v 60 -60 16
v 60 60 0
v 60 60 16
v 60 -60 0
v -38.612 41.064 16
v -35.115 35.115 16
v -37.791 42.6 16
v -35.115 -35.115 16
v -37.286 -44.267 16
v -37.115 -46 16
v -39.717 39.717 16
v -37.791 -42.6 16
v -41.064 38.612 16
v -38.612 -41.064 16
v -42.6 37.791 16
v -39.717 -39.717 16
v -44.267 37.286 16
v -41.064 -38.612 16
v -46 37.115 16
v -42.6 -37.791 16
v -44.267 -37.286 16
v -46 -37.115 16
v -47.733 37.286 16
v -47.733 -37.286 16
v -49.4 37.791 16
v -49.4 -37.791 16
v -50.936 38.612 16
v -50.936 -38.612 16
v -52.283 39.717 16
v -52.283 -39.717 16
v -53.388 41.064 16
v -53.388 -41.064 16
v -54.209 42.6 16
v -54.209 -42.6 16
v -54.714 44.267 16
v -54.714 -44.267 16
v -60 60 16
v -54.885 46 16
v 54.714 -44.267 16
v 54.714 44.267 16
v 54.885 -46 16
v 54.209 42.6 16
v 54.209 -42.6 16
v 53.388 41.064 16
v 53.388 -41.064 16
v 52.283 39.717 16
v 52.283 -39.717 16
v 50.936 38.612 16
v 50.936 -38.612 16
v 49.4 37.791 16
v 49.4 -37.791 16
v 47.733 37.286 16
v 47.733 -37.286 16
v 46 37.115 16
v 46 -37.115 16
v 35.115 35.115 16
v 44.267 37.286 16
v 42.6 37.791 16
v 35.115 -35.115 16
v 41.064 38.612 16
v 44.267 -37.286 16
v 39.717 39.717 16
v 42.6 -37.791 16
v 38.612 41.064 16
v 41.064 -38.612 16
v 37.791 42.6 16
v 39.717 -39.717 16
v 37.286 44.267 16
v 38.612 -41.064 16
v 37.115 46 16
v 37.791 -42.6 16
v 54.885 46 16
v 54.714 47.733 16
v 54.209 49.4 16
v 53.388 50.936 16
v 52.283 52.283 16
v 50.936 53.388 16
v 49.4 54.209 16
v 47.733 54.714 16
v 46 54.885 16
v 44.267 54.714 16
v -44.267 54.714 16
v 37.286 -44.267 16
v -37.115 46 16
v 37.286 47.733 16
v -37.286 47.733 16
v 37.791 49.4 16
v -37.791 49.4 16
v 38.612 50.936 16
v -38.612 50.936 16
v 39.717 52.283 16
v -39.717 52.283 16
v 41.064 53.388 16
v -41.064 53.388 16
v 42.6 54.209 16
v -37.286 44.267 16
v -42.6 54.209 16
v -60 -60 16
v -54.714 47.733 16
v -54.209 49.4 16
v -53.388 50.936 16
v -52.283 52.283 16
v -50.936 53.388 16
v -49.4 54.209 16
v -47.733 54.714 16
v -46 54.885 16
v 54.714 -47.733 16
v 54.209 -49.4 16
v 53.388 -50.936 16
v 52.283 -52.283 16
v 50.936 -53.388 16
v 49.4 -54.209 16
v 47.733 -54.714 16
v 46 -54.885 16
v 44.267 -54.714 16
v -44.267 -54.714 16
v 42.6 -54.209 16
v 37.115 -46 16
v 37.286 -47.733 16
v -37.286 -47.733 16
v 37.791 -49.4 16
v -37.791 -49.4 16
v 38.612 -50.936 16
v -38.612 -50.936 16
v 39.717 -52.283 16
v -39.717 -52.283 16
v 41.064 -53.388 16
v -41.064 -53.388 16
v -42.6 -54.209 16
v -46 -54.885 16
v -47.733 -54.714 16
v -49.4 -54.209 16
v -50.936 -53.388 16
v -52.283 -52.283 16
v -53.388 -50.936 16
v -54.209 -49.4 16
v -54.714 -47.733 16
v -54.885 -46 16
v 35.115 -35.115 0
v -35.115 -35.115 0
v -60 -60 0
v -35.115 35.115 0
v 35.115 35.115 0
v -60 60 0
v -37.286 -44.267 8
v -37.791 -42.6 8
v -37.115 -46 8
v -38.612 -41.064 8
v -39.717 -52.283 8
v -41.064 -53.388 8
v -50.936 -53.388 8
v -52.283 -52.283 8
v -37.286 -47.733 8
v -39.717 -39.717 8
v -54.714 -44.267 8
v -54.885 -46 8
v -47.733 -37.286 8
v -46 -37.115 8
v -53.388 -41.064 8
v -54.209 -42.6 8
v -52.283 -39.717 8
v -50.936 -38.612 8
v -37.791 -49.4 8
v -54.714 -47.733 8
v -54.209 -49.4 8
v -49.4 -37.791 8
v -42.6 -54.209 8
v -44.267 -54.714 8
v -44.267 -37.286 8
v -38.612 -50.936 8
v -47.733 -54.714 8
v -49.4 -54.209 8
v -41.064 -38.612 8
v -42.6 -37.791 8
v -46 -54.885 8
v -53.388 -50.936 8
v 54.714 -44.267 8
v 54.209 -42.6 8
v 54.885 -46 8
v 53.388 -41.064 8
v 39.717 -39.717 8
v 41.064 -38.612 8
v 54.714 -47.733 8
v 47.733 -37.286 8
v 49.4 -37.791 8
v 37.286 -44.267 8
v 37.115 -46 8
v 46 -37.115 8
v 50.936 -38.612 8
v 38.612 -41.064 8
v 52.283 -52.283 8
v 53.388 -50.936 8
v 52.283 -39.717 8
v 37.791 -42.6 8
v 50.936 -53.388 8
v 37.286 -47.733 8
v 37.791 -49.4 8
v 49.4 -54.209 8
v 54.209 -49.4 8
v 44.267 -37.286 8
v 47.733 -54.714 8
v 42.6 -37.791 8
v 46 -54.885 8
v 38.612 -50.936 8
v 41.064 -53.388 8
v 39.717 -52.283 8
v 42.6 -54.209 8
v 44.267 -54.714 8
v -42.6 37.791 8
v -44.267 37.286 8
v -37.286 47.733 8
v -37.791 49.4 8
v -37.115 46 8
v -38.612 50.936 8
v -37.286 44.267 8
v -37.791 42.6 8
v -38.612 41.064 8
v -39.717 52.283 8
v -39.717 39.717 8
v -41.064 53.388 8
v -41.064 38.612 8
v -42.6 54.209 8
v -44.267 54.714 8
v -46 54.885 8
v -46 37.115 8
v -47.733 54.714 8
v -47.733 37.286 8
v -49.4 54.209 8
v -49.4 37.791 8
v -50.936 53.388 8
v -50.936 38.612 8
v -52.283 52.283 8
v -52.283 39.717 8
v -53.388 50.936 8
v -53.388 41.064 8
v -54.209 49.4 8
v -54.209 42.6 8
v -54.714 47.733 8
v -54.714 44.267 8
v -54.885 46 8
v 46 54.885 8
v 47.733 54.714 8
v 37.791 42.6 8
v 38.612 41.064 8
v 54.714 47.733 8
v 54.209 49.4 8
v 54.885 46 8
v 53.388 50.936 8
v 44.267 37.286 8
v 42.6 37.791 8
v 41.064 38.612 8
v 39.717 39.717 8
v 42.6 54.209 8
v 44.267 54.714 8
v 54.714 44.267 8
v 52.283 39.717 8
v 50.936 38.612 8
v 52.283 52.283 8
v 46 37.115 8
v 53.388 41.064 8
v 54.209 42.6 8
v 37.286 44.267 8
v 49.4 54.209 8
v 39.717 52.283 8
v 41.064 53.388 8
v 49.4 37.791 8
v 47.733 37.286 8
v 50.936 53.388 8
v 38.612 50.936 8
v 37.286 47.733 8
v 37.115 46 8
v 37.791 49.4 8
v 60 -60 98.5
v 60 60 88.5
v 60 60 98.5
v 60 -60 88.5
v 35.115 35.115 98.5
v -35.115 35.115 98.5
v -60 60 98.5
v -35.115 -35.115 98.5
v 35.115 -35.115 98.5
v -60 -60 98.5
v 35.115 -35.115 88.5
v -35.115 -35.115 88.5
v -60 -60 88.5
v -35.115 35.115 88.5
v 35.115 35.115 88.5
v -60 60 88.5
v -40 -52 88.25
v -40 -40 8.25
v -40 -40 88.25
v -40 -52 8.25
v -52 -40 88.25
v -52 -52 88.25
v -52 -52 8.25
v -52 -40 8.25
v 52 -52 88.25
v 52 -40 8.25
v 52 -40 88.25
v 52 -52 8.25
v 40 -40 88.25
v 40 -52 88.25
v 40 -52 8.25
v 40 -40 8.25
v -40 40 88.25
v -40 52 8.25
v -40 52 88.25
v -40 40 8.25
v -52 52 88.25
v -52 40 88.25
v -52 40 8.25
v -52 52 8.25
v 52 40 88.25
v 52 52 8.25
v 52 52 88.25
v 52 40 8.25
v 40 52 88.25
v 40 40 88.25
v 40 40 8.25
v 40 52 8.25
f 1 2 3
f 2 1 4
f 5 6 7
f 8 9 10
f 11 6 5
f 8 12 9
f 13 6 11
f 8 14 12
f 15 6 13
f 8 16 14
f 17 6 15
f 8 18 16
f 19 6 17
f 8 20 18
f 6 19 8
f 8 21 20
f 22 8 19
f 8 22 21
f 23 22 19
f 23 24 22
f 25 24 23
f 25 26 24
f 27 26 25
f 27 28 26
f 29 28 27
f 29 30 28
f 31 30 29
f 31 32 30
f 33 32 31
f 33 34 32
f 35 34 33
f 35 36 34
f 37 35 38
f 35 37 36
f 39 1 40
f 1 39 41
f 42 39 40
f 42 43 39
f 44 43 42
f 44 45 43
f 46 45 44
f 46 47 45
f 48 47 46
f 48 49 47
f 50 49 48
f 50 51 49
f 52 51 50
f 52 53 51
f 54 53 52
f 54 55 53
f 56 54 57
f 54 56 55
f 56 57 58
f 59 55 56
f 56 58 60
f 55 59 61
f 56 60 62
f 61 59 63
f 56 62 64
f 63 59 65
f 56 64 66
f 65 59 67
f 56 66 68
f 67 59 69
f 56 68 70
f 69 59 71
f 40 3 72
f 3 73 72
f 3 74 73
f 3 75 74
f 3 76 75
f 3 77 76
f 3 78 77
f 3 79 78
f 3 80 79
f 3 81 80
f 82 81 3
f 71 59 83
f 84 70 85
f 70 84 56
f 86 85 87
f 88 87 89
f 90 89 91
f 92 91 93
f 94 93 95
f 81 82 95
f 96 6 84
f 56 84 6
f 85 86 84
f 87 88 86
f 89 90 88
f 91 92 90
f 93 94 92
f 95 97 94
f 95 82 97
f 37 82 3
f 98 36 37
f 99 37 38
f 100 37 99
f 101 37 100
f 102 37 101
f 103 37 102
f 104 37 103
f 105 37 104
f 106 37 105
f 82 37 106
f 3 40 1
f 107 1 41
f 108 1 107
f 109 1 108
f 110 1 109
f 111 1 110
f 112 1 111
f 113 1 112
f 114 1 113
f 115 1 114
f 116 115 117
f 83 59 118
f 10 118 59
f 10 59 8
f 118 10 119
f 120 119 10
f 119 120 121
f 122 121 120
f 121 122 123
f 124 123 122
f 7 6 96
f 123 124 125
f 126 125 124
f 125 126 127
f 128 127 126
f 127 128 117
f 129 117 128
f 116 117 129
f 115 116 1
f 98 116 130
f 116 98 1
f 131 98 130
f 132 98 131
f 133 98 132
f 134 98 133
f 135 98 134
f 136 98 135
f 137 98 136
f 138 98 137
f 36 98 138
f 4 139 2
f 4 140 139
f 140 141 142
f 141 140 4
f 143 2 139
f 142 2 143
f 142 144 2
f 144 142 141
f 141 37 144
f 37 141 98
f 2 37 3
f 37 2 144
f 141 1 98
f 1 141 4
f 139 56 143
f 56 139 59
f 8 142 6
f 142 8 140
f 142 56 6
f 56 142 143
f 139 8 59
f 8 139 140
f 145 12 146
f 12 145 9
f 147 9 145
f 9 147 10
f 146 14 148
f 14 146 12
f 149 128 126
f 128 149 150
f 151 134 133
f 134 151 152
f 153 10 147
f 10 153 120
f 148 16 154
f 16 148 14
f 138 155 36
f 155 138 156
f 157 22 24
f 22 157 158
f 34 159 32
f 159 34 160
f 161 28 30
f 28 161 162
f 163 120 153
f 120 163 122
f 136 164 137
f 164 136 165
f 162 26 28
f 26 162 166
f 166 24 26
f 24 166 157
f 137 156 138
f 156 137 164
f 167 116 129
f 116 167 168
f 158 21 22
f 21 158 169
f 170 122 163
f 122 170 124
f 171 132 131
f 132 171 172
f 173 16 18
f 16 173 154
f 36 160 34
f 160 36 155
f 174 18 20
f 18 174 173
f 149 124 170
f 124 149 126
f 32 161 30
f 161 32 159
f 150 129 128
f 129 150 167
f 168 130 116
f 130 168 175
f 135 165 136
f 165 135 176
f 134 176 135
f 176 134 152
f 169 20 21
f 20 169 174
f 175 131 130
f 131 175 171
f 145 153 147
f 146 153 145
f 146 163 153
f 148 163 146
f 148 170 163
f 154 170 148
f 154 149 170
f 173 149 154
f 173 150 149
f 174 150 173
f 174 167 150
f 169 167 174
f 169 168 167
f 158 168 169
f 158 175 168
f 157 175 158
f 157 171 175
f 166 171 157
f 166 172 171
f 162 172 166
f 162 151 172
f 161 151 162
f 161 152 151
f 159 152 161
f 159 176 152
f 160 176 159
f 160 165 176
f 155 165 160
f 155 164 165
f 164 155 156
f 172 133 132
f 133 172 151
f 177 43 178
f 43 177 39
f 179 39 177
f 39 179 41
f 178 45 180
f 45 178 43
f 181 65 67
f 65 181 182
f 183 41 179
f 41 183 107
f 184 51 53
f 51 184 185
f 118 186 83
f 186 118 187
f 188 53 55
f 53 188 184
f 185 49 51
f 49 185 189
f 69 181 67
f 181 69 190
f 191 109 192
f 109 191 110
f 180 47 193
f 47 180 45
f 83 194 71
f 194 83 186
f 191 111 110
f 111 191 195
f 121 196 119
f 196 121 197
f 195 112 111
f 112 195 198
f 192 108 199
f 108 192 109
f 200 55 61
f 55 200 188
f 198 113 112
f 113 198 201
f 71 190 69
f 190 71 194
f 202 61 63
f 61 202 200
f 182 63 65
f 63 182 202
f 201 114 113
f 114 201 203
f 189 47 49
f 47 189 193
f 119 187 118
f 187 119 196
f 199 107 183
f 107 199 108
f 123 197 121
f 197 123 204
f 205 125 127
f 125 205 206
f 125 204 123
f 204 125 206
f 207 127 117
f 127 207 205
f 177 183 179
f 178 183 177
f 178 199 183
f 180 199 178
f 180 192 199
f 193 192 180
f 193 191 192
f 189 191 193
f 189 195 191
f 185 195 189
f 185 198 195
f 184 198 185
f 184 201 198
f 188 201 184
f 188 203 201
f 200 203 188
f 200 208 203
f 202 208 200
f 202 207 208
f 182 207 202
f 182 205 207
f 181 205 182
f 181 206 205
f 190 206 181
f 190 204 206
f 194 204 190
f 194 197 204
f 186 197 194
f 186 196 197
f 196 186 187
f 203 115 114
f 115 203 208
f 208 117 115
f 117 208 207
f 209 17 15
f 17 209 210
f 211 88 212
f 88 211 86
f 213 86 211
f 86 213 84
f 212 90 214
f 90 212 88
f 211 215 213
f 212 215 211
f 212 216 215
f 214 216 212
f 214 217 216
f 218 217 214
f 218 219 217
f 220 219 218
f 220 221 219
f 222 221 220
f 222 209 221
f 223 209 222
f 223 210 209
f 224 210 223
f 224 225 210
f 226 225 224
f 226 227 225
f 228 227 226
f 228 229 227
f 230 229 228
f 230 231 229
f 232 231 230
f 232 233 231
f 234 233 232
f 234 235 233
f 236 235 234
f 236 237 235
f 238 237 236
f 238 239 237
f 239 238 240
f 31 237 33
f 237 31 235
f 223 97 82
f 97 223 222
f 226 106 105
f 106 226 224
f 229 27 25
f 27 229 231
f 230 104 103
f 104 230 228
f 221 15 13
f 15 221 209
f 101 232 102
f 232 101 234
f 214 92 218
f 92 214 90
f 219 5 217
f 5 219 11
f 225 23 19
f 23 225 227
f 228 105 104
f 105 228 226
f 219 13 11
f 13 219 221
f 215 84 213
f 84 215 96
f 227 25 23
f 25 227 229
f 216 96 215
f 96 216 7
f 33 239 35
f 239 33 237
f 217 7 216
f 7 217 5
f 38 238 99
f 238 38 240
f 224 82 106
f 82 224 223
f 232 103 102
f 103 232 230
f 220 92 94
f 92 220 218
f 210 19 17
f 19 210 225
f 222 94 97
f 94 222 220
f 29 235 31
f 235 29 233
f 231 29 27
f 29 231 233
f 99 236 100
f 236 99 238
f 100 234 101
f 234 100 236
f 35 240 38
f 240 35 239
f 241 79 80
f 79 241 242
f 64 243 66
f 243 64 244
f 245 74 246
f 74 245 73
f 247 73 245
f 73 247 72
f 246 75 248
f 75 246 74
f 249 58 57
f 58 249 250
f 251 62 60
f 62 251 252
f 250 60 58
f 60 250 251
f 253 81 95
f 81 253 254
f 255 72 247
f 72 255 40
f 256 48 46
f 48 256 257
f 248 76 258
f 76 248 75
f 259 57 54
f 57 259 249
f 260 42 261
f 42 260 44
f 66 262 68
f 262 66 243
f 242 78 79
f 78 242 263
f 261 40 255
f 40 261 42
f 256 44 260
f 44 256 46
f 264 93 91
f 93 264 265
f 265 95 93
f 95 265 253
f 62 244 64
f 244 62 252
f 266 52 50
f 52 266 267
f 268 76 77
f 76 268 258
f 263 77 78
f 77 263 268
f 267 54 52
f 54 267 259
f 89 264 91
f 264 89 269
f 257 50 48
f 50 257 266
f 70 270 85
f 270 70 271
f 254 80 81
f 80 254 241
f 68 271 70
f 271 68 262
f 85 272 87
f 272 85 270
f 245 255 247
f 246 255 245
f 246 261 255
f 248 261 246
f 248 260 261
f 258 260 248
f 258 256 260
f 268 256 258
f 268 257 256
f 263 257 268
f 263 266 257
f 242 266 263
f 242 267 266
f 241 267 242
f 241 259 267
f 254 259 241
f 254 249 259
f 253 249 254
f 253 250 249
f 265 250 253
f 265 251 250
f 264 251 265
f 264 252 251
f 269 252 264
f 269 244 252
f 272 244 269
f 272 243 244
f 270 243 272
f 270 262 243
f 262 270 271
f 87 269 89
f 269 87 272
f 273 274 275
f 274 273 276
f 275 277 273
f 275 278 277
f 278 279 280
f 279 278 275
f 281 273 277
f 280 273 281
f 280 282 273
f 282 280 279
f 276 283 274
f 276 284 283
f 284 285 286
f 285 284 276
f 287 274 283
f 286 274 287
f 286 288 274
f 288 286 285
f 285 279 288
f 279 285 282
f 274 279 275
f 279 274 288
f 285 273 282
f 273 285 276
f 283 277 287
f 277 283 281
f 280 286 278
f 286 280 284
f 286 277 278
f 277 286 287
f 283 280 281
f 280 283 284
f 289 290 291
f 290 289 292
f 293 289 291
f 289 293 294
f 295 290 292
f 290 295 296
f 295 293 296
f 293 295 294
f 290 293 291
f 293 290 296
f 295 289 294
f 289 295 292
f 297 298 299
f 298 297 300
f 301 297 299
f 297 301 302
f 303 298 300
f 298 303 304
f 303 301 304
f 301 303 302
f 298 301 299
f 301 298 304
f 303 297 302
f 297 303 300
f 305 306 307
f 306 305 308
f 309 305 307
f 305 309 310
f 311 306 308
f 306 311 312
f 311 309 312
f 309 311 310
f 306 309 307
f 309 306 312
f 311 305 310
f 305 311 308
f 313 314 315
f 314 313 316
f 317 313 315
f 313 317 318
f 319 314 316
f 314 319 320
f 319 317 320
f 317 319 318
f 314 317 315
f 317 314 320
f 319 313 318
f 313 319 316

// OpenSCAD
$fn = 32;

// ------------------------------------------------------------------------
// Frame cube: base 120 x 120 mm, posts 80 mm tall
// Every part is its own module, assembly() places every instance.
// ------------------------------------------------------------------------

// --- part 1 ---
module base_frame() {
  difference() {
    translate([-60, -60, 0]) cube([120, 120, 16]);
    translate([-35.115, -35.115, -1]) cube([70.23, 70.23, 18]);
    translate([-46, -46, 8]) cylinder(h = 9, d = 17.77);
    translate([46, -46, 8]) cylinder(h = 9, d = 17.77);
    translate([-46, 46, 8]) cylinder(h = 9, d = 17.77);
    translate([46, 46, 8]) cylinder(h = 9, d = 17.77);
  }
}

// --- part 2 ---
module corner_post() {
  translate([-6, -6, 0]) cube([12, 12, 80]);
}

// --- part 3 ---
module top_frame() {
  difference() {
    translate([-60, -60, 0]) cube([120, 120, 10]);
    translate([-35.115, -35.115, -1]) cube([70.23, 70.23, 12]);
  }
}

// --- assembly ---
module assembly() {
  color([0.80, 0.24, 0.20]) translate([0, 0, 0]) rotate([0, 0, 0]) base_frame();
  color([0.20, 0.45, 0.75]) translate([-46, -46, 8.25]) rotate([0, 0, 0]) corner_post();
  color([0.25, 0.62, 0.32]) translate([46, -46, 8.25]) rotate([0, 0, 0]) corner_post();
  color([0.92, 0.70, 0.18]) translate([-46, 46, 8.25]) rotate([0, 0, 0]) corner_post();
  color([0.58, 0.35, 0.70]) translate([46, 46, 8.25]) rotate([0, 0, 0]) corner_post();
  color([0.16, 0.66, 0.66]) translate([0, 0, 88.5]) rotate([0, 0, 0]) top_frame();
}

assembly();
